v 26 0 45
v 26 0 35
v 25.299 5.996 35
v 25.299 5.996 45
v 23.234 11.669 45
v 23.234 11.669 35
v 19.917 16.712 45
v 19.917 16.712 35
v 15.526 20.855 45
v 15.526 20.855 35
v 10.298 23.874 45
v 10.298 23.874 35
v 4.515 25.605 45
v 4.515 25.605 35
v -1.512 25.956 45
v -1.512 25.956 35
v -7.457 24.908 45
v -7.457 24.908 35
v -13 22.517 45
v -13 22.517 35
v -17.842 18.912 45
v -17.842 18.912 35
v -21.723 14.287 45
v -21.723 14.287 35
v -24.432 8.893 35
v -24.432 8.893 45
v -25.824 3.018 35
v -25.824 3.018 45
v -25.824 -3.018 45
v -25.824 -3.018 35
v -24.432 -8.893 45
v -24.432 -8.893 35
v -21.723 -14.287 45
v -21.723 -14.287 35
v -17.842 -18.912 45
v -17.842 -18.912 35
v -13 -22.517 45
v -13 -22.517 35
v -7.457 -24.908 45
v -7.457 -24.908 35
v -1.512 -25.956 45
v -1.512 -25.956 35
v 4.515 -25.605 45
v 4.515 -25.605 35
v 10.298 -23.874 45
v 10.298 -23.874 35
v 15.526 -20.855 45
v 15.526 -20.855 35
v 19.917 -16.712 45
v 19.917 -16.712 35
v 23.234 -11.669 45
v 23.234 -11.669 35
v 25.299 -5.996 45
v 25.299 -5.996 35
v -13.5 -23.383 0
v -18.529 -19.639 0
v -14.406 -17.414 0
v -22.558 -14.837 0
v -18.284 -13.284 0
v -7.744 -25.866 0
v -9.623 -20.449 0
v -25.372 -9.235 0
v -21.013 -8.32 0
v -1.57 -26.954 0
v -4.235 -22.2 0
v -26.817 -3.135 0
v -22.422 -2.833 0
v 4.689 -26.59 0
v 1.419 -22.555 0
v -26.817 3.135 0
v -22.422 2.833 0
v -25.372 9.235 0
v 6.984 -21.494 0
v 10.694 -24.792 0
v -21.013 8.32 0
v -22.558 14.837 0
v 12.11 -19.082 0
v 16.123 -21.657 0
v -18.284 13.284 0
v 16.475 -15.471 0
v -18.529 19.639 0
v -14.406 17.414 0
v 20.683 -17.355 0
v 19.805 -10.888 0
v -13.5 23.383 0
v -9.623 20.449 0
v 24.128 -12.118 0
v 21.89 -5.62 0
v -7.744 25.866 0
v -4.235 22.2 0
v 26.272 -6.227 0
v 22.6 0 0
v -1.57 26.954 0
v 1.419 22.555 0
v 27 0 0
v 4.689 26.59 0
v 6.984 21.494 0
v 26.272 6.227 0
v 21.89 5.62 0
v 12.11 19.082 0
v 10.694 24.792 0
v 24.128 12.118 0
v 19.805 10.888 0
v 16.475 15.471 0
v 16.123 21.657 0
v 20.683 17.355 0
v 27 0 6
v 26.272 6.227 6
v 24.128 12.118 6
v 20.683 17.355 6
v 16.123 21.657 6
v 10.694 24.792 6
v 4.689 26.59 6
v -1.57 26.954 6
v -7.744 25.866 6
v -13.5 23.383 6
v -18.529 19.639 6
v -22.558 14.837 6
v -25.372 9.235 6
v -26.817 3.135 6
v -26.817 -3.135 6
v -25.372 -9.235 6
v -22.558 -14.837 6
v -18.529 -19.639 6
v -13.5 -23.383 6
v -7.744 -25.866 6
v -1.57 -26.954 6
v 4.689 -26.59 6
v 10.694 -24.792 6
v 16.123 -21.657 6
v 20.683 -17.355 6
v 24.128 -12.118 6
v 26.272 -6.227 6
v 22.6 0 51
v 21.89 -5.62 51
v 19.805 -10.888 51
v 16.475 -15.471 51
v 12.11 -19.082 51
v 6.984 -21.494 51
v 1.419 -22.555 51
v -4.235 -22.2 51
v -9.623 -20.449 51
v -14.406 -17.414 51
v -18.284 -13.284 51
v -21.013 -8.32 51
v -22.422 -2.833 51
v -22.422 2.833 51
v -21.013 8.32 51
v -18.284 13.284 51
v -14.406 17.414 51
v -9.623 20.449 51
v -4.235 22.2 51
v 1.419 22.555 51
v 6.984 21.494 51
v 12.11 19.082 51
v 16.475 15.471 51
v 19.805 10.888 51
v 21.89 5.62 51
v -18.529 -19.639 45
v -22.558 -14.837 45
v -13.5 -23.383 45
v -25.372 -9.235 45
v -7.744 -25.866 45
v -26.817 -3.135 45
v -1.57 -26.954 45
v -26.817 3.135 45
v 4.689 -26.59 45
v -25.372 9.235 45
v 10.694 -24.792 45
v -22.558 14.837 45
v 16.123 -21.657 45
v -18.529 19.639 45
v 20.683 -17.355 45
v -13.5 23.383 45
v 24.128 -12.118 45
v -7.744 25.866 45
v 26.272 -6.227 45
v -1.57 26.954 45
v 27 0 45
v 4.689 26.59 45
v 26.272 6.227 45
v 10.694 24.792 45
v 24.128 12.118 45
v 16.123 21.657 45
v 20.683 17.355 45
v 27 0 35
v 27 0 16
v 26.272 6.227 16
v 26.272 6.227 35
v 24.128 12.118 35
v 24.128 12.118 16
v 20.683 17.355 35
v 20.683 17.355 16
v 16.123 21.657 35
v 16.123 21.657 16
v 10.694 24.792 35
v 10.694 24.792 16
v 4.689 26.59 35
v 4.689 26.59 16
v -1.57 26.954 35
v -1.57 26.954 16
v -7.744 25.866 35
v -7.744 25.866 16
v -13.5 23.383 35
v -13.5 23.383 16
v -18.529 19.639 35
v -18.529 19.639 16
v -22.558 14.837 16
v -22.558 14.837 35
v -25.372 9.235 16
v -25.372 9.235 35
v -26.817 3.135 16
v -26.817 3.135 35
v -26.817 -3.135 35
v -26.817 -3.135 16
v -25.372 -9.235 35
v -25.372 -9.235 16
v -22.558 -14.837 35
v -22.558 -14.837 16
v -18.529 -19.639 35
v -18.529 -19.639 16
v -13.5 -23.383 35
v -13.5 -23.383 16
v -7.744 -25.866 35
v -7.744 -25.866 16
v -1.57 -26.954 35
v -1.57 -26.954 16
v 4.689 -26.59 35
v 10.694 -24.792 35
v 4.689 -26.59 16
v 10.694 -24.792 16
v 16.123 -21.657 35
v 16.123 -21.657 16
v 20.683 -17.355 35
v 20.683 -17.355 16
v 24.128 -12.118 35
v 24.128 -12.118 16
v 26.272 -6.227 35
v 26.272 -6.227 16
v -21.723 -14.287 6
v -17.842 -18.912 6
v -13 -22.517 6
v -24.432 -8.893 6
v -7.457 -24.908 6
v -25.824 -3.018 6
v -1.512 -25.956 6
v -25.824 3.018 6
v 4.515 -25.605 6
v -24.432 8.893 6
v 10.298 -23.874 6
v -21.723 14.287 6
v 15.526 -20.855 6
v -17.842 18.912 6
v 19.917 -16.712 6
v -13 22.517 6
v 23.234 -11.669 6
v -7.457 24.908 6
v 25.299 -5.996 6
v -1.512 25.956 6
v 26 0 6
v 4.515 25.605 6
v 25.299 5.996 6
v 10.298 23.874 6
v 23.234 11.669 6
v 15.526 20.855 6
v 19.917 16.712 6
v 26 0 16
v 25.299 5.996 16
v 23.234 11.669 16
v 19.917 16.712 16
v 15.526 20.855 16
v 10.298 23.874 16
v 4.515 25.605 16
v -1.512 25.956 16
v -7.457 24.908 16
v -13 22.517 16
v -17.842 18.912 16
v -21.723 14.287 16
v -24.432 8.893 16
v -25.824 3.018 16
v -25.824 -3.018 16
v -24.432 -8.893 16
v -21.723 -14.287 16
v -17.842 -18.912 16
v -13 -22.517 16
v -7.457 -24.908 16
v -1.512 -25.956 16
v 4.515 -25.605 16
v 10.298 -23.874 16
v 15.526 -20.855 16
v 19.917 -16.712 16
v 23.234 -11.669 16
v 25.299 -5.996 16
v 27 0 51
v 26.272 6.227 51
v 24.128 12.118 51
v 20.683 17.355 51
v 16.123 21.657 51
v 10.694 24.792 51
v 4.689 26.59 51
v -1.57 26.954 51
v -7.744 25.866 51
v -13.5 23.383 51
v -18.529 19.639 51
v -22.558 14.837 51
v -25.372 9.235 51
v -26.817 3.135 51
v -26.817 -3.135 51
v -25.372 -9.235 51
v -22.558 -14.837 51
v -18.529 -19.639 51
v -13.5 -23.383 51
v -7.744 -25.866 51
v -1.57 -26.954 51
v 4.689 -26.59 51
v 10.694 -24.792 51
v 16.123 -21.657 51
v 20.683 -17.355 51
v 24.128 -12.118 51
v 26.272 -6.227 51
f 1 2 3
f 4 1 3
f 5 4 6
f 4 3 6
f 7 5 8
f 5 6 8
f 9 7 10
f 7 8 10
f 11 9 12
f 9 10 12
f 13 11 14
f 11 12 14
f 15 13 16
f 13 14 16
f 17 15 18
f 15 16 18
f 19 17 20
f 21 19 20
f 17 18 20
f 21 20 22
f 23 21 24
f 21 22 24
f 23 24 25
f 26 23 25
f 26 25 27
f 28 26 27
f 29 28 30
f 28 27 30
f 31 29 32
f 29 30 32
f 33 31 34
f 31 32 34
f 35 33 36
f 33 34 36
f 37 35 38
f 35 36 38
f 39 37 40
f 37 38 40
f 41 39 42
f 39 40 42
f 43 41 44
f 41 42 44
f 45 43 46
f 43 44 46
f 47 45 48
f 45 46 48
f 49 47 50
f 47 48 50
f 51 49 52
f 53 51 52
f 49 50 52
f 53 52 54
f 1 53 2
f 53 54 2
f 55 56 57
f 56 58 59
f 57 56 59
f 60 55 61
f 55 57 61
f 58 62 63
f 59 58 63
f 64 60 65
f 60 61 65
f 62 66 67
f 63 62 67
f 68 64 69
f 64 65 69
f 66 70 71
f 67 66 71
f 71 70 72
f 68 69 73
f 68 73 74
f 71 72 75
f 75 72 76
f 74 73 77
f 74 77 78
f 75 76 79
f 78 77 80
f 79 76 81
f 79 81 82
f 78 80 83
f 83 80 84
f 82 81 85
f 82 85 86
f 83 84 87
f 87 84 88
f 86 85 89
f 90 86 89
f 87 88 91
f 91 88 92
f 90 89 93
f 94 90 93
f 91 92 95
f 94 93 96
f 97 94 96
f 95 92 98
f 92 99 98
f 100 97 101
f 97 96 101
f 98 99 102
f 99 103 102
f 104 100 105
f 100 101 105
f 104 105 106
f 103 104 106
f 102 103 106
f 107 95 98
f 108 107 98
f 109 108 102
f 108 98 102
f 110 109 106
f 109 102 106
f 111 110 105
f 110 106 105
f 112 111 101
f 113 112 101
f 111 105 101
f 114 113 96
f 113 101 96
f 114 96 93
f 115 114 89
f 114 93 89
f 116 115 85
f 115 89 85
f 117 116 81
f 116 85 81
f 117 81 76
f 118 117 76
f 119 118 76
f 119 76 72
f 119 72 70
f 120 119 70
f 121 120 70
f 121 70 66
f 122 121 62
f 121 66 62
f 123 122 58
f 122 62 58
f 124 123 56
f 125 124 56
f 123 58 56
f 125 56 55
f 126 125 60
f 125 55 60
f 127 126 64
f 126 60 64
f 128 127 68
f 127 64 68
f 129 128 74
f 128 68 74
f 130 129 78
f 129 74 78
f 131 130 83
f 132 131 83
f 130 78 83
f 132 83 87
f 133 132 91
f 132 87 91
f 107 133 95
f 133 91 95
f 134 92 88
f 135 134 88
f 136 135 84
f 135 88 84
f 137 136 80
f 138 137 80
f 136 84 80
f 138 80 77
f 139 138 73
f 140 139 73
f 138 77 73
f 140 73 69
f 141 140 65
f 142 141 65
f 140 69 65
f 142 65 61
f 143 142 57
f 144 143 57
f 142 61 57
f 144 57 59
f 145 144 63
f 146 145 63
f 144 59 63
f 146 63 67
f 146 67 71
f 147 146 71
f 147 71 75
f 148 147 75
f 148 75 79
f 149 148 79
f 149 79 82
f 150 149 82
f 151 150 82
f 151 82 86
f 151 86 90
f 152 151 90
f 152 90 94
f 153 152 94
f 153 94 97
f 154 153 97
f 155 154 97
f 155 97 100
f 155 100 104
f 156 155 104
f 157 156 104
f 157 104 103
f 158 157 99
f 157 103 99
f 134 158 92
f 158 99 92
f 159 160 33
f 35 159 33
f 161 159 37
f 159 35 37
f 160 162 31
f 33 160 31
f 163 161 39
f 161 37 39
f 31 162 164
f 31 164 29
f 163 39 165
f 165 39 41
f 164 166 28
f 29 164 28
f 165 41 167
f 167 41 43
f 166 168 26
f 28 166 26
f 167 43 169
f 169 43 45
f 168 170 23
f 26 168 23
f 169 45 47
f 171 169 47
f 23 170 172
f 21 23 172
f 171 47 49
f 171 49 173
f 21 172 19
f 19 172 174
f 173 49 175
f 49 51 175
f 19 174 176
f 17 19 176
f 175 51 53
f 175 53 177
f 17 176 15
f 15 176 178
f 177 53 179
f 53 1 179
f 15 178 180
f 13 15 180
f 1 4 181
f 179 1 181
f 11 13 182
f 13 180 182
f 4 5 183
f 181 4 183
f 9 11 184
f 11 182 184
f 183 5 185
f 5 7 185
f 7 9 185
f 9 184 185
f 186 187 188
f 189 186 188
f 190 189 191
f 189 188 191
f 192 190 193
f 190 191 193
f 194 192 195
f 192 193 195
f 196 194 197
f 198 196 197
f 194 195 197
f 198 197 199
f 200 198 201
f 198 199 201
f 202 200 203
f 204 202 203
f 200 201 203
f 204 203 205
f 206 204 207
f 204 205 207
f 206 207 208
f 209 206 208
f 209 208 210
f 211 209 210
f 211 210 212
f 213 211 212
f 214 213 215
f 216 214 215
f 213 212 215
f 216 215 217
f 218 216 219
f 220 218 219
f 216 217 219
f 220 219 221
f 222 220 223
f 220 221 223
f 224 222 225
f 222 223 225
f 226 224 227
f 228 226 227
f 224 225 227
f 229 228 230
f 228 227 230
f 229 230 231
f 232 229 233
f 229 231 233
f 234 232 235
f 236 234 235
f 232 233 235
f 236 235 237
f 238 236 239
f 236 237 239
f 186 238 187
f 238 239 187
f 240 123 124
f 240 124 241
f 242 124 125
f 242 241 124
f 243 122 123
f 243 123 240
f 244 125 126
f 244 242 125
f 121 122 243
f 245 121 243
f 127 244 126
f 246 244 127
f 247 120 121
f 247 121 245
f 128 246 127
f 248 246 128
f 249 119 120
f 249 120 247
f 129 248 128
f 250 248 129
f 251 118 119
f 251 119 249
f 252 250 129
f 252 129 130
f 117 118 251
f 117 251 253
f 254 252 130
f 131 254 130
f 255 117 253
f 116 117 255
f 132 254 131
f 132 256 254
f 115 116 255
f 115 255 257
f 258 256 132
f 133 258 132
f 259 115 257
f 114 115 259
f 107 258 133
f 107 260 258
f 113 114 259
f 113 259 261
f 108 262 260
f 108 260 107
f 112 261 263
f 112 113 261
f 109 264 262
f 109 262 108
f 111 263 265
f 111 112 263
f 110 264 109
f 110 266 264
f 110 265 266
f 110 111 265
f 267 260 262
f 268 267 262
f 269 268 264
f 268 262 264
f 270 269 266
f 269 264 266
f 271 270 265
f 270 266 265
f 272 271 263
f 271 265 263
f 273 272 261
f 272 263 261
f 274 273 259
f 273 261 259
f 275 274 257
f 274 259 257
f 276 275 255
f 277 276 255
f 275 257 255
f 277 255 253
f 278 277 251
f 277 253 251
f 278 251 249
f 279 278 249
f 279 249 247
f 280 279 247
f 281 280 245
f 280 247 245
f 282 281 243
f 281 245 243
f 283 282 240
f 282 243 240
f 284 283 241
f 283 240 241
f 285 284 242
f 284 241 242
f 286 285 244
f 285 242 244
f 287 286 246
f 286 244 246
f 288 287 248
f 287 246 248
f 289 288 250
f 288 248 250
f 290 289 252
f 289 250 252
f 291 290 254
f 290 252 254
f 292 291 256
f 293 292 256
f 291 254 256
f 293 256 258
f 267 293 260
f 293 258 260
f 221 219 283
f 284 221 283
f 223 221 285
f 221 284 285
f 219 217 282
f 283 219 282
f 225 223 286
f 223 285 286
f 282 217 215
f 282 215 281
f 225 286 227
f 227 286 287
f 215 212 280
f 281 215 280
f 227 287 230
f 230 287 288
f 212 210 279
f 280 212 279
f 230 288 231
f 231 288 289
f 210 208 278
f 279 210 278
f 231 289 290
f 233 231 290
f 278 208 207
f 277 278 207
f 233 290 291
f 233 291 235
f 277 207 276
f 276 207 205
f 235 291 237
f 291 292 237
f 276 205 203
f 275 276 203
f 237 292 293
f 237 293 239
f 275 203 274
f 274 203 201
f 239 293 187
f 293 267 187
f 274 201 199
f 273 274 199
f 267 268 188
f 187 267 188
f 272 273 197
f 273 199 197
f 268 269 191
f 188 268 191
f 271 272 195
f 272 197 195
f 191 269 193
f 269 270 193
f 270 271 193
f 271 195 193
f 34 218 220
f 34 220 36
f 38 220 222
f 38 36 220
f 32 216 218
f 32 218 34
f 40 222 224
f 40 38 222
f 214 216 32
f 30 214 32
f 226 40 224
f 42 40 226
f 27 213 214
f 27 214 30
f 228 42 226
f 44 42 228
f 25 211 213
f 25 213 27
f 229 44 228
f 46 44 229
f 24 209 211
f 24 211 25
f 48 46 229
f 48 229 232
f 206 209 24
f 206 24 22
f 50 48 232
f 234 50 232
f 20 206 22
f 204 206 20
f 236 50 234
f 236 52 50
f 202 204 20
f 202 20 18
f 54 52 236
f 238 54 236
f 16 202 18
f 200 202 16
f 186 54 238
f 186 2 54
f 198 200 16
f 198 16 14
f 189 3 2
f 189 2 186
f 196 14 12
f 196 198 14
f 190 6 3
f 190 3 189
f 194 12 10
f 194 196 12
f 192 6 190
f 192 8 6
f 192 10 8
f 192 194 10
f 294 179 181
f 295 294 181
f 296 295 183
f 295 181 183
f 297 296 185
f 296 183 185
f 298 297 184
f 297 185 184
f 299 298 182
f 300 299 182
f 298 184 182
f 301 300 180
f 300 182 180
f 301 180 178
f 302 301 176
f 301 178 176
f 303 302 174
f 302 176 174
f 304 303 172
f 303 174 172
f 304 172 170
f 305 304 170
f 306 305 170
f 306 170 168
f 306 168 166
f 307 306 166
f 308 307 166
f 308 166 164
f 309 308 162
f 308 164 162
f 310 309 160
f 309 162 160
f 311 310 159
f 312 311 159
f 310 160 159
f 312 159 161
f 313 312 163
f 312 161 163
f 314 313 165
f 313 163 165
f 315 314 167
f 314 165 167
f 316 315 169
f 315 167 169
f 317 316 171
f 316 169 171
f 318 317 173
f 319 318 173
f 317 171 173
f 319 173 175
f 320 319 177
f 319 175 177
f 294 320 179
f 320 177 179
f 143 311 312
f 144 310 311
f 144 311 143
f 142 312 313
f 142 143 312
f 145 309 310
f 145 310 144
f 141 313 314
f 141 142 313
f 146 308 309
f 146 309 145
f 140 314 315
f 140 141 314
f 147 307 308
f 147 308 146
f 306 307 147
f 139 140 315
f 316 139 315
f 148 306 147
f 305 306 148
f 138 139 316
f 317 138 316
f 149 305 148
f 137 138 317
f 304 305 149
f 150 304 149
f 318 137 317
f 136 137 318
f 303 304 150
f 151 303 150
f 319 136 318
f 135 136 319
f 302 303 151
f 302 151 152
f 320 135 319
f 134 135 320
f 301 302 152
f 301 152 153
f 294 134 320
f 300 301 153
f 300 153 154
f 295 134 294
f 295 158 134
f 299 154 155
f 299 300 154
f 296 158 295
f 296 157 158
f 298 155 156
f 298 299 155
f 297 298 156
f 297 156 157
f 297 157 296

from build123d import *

# Parameters (mm, degrees)
F0_R      = 27
F1_DEPTH  = 6
F2_R      = 26
F3_DEPTH  = 10
F4_R      = 27
F5_DEPTH  = 19
F6_R      = 26
F7_DEPTH  = 10
F8_R      = 27
F9_DEPTH  = 6
F10_R     = 22.6
F11_DEPTH = 51.001


with BuildPart() as f1:
    # F0 (on Top) → F1 (new body)
    with BuildSketch(Plane.XY):
        Circle(F0_R)
    extrude(amount=F1_DEPTH)

    # F2 (on face) → F3 (join)
    with BuildSketch(Plane.XY.offset(6)):
        Circle(F2_R)
    extrude(amount=F3_DEPTH)

    # F4 (on face) → F5 (join)
    with BuildSketch(Plane.XY.offset(16)):
        Circle(F4_R)
    extrude(amount=F5_DEPTH)

    # F6 (on face) → F7 (join)
    with BuildSketch(Plane.XY.offset(35)):
        Circle(F6_R)
    extrude(amount=F7_DEPTH)

    # F8 (on face) → F9 (join)
    with BuildSketch(Plane.XY.offset(45)):
        Circle(F8_R)
    extrude(amount=F9_DEPTH)

    # F10 (on face) → F11 (cut, through all)
    with BuildSketch(Plane(origin=(0, 0, 0), x_dir=(1, 0, 0), z_dir=(0, 0, -1))):
        Circle(F10_R)
    extrude(amount=-F11_DEPTH, mode=Mode.SUBTRACT)


solid = f1.part
